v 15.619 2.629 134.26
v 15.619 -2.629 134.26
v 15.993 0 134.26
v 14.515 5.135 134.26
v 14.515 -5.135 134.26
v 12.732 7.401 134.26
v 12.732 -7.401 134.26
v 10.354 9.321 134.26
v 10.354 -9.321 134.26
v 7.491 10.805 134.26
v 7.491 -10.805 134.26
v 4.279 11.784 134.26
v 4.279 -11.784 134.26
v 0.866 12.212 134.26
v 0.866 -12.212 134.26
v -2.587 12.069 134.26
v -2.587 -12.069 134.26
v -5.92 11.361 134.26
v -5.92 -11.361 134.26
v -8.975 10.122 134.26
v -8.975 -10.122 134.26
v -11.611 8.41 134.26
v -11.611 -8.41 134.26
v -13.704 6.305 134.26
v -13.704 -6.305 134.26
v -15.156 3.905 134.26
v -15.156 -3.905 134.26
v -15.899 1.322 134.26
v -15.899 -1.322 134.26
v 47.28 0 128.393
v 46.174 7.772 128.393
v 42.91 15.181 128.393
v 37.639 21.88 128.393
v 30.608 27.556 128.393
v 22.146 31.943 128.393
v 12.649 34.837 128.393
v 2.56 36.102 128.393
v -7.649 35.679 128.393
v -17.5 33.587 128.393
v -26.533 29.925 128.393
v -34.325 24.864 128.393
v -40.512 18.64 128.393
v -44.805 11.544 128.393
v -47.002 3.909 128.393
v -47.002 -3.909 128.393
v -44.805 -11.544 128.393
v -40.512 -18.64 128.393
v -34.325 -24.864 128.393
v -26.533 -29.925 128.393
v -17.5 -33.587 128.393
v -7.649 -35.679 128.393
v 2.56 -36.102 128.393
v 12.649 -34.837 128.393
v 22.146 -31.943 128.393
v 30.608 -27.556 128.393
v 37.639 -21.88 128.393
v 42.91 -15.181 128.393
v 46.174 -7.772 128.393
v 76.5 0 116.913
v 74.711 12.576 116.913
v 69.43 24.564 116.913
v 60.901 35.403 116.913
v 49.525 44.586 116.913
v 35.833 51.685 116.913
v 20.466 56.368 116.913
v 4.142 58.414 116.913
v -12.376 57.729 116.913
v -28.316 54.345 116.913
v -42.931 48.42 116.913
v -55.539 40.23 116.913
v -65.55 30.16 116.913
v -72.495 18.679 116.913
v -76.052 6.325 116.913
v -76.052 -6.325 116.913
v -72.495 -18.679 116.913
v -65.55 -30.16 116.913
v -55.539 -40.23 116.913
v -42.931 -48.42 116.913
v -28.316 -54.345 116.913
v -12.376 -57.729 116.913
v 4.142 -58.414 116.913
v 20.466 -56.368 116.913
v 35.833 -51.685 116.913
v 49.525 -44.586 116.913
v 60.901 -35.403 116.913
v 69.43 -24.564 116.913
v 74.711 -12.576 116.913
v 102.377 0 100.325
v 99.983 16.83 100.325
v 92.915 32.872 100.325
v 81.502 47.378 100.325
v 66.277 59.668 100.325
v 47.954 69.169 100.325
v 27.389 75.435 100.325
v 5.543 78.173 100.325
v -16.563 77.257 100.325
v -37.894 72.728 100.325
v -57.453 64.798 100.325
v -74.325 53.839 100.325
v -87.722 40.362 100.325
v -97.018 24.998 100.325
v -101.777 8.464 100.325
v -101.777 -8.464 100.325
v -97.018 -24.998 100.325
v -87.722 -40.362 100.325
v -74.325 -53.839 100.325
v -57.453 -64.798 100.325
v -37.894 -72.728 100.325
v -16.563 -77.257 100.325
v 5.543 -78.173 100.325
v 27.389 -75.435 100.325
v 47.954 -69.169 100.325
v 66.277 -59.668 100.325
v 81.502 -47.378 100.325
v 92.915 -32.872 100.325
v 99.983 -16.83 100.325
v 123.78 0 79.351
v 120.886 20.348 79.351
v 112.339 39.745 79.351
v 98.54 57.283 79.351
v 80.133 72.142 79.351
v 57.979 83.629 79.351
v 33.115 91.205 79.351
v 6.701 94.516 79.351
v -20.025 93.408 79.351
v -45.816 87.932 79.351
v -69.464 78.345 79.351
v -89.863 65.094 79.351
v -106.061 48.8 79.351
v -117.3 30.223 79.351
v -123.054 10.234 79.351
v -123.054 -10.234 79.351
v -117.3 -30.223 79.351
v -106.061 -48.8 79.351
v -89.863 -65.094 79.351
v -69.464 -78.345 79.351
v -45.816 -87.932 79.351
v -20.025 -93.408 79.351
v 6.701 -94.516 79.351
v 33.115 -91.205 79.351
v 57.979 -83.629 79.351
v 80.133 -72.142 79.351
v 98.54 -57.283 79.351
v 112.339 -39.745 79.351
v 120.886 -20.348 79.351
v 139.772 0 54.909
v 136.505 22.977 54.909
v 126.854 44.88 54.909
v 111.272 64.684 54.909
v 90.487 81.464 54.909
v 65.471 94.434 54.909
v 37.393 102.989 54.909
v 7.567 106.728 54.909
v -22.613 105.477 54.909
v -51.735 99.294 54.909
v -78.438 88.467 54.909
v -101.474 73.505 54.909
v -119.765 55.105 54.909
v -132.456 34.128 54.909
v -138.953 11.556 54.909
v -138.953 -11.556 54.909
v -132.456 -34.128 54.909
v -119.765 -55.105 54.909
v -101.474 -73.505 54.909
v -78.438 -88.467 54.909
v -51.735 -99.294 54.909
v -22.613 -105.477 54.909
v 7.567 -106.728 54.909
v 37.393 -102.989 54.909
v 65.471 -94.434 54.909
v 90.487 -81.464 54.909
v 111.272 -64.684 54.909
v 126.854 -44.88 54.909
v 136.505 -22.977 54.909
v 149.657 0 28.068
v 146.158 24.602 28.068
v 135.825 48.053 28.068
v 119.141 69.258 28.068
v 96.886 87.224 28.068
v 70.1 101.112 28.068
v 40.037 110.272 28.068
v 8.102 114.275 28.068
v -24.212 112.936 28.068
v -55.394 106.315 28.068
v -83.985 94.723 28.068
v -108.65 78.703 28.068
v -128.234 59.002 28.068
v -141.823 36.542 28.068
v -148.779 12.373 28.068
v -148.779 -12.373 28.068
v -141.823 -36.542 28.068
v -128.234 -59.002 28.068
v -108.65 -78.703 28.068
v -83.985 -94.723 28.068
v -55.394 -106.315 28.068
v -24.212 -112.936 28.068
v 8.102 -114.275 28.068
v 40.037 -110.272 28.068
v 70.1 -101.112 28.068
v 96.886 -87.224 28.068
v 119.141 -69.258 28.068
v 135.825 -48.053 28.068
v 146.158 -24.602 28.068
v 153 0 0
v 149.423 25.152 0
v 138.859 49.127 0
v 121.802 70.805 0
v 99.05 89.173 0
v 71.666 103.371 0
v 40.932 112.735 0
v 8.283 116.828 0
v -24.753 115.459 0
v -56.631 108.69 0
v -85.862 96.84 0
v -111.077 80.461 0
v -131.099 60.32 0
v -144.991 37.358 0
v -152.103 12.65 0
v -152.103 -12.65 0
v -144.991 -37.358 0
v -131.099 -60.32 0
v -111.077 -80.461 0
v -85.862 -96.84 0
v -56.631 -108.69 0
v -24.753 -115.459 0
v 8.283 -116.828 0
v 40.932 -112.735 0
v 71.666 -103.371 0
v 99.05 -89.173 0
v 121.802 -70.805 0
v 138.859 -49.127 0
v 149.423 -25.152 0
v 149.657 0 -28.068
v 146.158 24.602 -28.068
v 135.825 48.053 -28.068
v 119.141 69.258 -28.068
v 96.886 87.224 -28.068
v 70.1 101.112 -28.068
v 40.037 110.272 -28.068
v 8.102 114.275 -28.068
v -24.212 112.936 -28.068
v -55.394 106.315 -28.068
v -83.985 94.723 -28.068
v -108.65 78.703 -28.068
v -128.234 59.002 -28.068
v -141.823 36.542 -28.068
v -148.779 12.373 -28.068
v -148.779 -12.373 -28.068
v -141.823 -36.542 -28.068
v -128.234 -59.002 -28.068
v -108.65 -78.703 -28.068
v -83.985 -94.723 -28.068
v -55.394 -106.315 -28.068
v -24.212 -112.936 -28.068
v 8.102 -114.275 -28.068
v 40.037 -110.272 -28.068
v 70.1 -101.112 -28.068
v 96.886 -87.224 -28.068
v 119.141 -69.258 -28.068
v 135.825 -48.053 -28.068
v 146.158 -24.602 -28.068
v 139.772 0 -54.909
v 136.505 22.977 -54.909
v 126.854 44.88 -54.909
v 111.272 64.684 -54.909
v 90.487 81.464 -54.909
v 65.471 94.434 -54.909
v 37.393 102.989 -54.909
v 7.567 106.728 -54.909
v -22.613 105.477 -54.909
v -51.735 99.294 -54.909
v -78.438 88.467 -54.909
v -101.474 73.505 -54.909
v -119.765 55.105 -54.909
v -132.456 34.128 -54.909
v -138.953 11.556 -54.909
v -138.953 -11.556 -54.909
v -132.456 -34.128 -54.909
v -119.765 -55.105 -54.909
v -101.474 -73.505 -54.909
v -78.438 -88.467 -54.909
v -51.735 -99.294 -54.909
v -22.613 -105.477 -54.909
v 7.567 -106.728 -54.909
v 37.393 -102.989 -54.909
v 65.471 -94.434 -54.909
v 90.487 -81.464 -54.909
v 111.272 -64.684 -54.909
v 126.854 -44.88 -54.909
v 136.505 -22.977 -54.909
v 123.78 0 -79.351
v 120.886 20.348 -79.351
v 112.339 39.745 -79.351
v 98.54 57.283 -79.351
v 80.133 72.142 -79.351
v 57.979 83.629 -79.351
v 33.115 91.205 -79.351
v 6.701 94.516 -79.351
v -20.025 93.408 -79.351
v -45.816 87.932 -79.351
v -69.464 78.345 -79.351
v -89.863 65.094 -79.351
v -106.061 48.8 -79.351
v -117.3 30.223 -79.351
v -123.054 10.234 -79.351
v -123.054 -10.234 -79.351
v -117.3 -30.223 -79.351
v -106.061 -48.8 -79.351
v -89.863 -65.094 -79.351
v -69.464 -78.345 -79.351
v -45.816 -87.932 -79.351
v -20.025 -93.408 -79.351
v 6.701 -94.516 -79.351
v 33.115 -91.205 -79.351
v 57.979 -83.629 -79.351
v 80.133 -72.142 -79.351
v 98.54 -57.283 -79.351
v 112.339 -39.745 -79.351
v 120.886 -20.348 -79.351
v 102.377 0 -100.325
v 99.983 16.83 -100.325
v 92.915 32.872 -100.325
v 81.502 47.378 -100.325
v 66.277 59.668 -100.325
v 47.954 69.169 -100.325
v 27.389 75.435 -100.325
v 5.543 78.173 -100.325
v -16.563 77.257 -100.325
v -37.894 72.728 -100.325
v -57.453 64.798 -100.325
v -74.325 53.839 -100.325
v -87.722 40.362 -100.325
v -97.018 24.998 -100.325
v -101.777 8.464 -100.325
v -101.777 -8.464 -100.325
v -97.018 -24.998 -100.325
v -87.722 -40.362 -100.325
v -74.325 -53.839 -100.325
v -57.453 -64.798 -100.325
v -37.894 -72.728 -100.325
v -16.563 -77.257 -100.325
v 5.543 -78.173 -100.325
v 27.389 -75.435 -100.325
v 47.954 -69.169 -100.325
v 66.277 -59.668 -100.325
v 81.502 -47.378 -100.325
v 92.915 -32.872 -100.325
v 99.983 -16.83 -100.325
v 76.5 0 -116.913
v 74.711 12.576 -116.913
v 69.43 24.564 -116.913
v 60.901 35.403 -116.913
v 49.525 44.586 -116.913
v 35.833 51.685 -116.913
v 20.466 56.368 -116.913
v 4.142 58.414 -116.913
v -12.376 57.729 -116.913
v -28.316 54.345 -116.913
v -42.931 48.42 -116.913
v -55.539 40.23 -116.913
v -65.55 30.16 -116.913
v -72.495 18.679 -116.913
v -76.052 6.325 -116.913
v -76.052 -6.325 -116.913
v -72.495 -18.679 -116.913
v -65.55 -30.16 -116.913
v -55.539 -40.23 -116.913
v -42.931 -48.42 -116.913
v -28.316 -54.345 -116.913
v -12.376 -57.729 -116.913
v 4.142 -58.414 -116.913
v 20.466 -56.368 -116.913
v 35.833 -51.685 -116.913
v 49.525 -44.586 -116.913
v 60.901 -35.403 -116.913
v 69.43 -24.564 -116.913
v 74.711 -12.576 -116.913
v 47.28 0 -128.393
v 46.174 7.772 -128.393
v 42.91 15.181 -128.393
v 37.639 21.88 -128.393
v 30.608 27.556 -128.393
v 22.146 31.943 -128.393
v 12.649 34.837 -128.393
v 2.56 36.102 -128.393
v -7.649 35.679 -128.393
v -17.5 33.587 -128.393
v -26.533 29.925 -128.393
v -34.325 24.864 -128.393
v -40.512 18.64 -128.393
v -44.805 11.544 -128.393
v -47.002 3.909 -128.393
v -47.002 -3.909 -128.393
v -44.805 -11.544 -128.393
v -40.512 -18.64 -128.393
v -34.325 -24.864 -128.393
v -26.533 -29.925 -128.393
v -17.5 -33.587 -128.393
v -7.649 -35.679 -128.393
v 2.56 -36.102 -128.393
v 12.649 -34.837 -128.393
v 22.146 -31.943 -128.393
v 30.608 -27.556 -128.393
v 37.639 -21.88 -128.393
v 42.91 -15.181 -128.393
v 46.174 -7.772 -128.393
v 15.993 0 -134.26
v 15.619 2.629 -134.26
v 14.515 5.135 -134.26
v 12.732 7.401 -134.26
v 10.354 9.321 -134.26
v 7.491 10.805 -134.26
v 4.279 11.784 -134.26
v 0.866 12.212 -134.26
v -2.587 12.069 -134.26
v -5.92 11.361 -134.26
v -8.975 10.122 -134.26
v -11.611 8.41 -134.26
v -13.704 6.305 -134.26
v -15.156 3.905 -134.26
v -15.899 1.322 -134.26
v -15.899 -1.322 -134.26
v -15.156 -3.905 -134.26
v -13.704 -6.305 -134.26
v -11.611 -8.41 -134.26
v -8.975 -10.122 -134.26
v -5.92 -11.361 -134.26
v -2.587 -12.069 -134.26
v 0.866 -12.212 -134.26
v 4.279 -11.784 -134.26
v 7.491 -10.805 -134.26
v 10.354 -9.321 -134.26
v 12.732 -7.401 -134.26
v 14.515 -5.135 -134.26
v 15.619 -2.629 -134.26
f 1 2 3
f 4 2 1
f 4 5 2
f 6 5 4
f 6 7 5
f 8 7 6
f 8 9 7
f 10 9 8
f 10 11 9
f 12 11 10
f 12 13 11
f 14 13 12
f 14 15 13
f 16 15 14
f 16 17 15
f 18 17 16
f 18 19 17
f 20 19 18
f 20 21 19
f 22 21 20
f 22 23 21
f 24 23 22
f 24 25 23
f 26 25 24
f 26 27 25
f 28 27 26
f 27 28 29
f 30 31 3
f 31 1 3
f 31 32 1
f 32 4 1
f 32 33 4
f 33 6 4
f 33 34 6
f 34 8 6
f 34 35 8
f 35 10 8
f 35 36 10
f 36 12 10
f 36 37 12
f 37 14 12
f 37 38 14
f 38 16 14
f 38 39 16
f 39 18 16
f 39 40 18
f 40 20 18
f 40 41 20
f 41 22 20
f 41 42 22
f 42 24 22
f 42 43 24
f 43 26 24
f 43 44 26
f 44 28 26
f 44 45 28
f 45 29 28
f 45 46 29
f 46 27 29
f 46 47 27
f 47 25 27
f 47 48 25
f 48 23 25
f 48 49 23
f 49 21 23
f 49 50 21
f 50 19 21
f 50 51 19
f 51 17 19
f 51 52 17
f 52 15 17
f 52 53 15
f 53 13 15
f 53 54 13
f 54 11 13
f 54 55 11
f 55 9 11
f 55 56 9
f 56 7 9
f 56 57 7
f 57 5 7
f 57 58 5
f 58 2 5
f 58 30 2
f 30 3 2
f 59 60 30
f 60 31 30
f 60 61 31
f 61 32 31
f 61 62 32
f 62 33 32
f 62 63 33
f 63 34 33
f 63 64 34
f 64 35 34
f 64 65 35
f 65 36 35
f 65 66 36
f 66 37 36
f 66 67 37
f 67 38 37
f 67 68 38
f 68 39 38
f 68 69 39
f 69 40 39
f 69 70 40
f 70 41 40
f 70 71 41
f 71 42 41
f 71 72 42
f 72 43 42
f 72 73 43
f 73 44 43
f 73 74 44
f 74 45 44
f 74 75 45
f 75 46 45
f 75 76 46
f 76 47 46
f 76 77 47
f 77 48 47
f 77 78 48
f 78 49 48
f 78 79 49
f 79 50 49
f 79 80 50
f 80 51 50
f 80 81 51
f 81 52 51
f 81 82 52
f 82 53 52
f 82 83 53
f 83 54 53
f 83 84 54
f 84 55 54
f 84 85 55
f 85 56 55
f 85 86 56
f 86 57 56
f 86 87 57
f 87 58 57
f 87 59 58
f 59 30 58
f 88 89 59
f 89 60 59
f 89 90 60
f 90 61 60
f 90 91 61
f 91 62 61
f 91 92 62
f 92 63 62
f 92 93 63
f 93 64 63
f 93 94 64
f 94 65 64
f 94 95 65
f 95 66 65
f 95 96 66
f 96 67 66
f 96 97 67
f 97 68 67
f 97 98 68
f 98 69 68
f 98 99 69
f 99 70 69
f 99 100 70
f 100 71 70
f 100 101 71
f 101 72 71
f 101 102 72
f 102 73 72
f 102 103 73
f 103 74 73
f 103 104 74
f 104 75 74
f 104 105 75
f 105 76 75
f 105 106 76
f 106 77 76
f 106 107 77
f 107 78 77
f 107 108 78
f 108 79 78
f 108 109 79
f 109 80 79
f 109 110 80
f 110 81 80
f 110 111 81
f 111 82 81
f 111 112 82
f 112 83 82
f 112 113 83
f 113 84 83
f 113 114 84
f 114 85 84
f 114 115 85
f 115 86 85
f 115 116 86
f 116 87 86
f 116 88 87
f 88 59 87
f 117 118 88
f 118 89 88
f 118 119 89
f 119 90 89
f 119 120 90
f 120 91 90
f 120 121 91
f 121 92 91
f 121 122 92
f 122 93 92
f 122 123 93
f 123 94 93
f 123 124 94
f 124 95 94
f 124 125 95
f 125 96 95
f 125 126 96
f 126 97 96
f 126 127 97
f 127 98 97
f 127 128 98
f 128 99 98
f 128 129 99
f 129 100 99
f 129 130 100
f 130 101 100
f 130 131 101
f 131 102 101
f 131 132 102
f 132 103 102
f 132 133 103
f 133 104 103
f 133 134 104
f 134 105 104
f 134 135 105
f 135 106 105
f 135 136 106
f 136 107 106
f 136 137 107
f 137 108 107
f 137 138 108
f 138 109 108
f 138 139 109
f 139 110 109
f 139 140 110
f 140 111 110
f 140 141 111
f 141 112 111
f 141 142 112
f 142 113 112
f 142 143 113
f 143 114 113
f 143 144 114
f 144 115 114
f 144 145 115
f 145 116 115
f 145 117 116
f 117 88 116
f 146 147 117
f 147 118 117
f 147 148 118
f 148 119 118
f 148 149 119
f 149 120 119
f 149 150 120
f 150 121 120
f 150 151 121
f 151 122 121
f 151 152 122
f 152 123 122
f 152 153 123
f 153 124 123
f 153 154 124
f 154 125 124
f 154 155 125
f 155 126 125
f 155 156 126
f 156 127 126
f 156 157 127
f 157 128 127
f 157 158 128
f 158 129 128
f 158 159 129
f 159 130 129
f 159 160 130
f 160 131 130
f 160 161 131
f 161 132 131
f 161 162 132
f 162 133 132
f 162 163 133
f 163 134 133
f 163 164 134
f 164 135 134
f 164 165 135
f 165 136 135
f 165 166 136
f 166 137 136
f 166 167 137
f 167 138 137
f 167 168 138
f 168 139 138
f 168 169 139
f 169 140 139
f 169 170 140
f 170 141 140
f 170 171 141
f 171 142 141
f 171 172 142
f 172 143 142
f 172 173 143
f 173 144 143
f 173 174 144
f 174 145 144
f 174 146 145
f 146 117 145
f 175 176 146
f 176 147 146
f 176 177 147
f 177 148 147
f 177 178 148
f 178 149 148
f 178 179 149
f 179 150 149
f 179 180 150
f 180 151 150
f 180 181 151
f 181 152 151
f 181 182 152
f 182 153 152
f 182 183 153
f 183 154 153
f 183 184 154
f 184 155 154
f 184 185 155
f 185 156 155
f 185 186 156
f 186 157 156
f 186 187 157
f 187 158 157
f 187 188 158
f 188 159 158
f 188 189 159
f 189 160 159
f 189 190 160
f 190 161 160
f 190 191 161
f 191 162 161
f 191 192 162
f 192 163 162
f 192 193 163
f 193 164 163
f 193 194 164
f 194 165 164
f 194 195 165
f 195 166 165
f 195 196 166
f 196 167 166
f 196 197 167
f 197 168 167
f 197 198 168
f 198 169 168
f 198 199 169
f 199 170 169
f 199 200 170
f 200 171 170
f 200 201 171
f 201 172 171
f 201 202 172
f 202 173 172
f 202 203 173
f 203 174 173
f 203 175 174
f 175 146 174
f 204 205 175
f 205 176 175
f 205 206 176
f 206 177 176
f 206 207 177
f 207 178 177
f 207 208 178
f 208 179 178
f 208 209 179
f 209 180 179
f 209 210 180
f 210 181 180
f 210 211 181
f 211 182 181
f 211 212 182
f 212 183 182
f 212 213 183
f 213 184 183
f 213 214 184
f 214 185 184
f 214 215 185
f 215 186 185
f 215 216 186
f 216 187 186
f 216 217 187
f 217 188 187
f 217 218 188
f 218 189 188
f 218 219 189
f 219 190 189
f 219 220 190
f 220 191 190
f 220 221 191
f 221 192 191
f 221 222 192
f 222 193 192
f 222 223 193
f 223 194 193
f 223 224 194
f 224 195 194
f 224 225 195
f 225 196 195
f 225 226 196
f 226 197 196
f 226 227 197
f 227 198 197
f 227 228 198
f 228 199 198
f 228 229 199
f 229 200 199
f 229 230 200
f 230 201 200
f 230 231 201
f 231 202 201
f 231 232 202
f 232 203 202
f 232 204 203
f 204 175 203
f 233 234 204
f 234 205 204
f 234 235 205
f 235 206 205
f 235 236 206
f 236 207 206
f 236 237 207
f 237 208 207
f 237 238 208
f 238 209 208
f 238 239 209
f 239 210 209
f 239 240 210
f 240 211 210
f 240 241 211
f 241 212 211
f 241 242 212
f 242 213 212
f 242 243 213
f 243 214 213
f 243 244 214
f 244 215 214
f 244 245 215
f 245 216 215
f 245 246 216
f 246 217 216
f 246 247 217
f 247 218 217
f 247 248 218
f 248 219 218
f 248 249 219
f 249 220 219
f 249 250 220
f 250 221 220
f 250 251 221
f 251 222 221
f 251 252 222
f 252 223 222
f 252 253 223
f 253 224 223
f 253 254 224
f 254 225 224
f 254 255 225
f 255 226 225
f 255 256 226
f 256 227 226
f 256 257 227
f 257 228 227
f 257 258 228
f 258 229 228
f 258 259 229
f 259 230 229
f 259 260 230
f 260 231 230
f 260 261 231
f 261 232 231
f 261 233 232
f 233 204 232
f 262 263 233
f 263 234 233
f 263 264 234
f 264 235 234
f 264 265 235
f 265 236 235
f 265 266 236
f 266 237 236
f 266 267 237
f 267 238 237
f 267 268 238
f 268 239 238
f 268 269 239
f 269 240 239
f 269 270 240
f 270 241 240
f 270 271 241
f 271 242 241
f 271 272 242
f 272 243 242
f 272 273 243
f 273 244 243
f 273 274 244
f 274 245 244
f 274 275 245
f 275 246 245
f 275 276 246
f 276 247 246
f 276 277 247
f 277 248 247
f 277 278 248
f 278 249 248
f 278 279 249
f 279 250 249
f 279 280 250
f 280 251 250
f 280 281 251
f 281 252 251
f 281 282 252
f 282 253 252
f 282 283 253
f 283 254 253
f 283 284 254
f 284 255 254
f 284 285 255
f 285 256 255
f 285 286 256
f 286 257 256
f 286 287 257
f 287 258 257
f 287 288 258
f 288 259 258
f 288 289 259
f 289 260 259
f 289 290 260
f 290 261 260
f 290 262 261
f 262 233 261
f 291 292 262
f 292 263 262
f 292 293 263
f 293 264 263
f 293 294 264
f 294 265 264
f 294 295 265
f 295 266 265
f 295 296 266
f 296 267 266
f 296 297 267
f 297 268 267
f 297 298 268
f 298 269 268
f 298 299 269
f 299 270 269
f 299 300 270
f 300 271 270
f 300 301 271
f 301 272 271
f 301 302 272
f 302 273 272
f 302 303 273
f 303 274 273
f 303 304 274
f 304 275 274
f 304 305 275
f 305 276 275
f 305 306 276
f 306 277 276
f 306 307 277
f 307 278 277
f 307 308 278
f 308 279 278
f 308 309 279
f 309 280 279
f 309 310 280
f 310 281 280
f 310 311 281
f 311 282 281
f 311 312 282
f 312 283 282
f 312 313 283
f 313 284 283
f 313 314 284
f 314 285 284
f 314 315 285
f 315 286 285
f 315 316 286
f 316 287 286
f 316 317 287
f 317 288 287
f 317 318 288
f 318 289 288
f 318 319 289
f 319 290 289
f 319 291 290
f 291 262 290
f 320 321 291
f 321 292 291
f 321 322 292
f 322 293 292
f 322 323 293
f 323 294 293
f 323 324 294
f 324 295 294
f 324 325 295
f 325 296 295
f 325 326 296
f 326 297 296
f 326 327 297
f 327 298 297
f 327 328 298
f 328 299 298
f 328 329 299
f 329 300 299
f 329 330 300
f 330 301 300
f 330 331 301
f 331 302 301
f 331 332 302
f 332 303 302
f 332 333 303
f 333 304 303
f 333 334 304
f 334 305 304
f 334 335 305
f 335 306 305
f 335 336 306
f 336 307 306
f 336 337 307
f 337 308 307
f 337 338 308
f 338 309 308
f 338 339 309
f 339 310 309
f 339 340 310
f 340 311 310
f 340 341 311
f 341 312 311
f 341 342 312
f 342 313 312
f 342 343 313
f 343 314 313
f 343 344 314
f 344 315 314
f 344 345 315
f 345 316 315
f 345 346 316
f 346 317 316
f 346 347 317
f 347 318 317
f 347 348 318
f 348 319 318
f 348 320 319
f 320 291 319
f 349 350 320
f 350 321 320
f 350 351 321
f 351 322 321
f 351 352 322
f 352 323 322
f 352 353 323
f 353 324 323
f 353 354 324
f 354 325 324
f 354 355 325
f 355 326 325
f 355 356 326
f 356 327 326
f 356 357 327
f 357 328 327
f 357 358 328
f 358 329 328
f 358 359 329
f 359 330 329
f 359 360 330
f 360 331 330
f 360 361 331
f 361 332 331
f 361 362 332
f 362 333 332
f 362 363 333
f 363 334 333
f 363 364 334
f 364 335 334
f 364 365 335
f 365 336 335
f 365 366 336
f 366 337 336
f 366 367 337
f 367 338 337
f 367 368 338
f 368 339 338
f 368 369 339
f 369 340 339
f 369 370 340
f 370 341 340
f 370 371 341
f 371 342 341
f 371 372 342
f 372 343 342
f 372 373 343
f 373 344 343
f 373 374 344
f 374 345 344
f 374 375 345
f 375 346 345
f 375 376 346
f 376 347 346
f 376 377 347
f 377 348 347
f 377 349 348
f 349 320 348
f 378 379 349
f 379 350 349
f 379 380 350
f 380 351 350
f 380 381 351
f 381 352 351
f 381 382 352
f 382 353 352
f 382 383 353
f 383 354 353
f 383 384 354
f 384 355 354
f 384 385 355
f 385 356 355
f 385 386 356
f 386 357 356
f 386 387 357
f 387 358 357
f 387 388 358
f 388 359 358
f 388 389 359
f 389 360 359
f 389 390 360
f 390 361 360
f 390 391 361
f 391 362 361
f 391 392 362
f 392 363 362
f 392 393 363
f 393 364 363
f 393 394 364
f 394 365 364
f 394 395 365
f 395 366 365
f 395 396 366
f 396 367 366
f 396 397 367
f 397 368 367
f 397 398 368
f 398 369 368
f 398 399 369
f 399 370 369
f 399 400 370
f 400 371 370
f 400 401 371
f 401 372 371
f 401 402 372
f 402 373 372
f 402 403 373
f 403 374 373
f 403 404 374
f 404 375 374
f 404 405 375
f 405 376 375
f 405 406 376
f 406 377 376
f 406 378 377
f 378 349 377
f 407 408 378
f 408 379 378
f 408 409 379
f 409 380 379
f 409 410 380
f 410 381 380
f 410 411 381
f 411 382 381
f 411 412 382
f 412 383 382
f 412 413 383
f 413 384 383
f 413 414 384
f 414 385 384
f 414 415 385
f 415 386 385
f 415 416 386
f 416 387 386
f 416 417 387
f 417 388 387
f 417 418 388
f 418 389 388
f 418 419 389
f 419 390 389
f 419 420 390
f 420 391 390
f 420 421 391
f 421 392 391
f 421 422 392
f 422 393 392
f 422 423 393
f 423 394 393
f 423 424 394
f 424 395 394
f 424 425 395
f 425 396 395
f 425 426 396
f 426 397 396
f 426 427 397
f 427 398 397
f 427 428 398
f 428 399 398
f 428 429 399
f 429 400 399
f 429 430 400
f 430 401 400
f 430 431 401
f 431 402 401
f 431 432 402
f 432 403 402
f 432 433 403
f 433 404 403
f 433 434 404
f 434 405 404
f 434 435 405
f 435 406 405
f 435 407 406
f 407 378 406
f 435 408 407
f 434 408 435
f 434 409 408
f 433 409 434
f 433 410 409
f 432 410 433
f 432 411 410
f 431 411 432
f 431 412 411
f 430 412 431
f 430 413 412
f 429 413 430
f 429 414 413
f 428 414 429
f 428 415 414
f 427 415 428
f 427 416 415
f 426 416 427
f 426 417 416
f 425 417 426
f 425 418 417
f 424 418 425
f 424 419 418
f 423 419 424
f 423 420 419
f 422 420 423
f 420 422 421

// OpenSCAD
// Generated by SolidPython 1.0.1 on 2020-07-29 00:46:53


scale(v = [17, 13, 15]) {
	sphere(r = 9);
}
/***********************************************
*********      SolidPython code:      **********
************************************************
 
# import packages: SolidPython
from solid import *
from solid.utils import *
from itertools import chain, combinations, permutations


class Resize:

    def __init__(self, scad_file):
        self.scad_file = scad_file
        #self.scad_file = import_scad(scad_file)
        # cone/cylinder param:
        self.r1 = 0
        self.r2 = 0
        self.h = 0
        # rectangular prism param:
        self.w = 0
        self.l = 0
        # ellipse param:
        self.r = 0

    # import OpenScad code (file name corresponds to shape)


    # classify shape + parameters
    def assign(self, param1, param2, param3):
        if self.scad_file == 'cone.scad':
            self.r1 = param1
            self.r2 = param2
            self.h = param3
        elif self.scad_file == 'cylinder.scad':
            self.r1 = param1
            self.r2 = param2
            self.h = param3
        elif self.scad_file == 'rectangularPrism.scad':
            self.h = param1
            self.l = param2
            self.w = param3
        else:
            self.r = param1
            self.h = param2

    # resize parameters
    def iterate(self):
        x = range(3, 20, 2)
        i = 1
        if self.scad_file == 'cone.scad':
            tempList = list(permutations(x, 2))
            for temp in tempList:
                param1 = temp[0]
                param2 = temp[1]
                filepath = 'produced_scad_files/' + 'cone' + str(param1) + '_' + str(param2) + '_' + '.scad'
                scad_render_to_file(cylinder(h=param1, r1=param2, r2=0), filepath)

        elif self.scad_file == 'cylinder.scad':
            tempList = list(permutations(x, 3))
            for temp in tempList:
                param1 = temp[0]
                param2 = temp[1]
                filepath = 'produced_scad_files/' + 'cylinder' + str(param1) + '_' + str(param2) + '_' + '.scad'
                scad_render_to_file(cylinder(h=param1, r1=param2, r2=param2), filepath)

        elif self.scad_file == 'rectangularPrism.scad':
            tempList = list(permutations(x, 3))
            for temp in tempList:
                param1 = temp[0]
                param2 = temp[1]
                param3 = temp[2]
                filepath = 'produced_scad_files/' + 'rectangularPrism' + str(param1) + '_' + str(param2) + '_' + str(
                    param3) + '.scad'
                scad_render_to_file(cube(size=(param1, param2, param3)), filepath)

        elif self.scad_file == 'ellipse.scad':
            tempList = list(permutations(x, 4))
            for temp in tempList:
                param1 = temp[0]
                param2 = temp[1]
                param3 = temp[2]
                param4 = temp[3]
                filepath = 'produced_scad_files/' + 'ellipse' + str(param1) + '_' + str(param2) + '_' + str(param3) + '_' + str(param4) + '.scad'
                scad_render_to_file(scale([param1, param2, param3])(sphere(r=param4)), filepath)

    def render_to_scadfile(self):
        scad_render_to_file(scad, 'example.scad') 
 
************************************************/
